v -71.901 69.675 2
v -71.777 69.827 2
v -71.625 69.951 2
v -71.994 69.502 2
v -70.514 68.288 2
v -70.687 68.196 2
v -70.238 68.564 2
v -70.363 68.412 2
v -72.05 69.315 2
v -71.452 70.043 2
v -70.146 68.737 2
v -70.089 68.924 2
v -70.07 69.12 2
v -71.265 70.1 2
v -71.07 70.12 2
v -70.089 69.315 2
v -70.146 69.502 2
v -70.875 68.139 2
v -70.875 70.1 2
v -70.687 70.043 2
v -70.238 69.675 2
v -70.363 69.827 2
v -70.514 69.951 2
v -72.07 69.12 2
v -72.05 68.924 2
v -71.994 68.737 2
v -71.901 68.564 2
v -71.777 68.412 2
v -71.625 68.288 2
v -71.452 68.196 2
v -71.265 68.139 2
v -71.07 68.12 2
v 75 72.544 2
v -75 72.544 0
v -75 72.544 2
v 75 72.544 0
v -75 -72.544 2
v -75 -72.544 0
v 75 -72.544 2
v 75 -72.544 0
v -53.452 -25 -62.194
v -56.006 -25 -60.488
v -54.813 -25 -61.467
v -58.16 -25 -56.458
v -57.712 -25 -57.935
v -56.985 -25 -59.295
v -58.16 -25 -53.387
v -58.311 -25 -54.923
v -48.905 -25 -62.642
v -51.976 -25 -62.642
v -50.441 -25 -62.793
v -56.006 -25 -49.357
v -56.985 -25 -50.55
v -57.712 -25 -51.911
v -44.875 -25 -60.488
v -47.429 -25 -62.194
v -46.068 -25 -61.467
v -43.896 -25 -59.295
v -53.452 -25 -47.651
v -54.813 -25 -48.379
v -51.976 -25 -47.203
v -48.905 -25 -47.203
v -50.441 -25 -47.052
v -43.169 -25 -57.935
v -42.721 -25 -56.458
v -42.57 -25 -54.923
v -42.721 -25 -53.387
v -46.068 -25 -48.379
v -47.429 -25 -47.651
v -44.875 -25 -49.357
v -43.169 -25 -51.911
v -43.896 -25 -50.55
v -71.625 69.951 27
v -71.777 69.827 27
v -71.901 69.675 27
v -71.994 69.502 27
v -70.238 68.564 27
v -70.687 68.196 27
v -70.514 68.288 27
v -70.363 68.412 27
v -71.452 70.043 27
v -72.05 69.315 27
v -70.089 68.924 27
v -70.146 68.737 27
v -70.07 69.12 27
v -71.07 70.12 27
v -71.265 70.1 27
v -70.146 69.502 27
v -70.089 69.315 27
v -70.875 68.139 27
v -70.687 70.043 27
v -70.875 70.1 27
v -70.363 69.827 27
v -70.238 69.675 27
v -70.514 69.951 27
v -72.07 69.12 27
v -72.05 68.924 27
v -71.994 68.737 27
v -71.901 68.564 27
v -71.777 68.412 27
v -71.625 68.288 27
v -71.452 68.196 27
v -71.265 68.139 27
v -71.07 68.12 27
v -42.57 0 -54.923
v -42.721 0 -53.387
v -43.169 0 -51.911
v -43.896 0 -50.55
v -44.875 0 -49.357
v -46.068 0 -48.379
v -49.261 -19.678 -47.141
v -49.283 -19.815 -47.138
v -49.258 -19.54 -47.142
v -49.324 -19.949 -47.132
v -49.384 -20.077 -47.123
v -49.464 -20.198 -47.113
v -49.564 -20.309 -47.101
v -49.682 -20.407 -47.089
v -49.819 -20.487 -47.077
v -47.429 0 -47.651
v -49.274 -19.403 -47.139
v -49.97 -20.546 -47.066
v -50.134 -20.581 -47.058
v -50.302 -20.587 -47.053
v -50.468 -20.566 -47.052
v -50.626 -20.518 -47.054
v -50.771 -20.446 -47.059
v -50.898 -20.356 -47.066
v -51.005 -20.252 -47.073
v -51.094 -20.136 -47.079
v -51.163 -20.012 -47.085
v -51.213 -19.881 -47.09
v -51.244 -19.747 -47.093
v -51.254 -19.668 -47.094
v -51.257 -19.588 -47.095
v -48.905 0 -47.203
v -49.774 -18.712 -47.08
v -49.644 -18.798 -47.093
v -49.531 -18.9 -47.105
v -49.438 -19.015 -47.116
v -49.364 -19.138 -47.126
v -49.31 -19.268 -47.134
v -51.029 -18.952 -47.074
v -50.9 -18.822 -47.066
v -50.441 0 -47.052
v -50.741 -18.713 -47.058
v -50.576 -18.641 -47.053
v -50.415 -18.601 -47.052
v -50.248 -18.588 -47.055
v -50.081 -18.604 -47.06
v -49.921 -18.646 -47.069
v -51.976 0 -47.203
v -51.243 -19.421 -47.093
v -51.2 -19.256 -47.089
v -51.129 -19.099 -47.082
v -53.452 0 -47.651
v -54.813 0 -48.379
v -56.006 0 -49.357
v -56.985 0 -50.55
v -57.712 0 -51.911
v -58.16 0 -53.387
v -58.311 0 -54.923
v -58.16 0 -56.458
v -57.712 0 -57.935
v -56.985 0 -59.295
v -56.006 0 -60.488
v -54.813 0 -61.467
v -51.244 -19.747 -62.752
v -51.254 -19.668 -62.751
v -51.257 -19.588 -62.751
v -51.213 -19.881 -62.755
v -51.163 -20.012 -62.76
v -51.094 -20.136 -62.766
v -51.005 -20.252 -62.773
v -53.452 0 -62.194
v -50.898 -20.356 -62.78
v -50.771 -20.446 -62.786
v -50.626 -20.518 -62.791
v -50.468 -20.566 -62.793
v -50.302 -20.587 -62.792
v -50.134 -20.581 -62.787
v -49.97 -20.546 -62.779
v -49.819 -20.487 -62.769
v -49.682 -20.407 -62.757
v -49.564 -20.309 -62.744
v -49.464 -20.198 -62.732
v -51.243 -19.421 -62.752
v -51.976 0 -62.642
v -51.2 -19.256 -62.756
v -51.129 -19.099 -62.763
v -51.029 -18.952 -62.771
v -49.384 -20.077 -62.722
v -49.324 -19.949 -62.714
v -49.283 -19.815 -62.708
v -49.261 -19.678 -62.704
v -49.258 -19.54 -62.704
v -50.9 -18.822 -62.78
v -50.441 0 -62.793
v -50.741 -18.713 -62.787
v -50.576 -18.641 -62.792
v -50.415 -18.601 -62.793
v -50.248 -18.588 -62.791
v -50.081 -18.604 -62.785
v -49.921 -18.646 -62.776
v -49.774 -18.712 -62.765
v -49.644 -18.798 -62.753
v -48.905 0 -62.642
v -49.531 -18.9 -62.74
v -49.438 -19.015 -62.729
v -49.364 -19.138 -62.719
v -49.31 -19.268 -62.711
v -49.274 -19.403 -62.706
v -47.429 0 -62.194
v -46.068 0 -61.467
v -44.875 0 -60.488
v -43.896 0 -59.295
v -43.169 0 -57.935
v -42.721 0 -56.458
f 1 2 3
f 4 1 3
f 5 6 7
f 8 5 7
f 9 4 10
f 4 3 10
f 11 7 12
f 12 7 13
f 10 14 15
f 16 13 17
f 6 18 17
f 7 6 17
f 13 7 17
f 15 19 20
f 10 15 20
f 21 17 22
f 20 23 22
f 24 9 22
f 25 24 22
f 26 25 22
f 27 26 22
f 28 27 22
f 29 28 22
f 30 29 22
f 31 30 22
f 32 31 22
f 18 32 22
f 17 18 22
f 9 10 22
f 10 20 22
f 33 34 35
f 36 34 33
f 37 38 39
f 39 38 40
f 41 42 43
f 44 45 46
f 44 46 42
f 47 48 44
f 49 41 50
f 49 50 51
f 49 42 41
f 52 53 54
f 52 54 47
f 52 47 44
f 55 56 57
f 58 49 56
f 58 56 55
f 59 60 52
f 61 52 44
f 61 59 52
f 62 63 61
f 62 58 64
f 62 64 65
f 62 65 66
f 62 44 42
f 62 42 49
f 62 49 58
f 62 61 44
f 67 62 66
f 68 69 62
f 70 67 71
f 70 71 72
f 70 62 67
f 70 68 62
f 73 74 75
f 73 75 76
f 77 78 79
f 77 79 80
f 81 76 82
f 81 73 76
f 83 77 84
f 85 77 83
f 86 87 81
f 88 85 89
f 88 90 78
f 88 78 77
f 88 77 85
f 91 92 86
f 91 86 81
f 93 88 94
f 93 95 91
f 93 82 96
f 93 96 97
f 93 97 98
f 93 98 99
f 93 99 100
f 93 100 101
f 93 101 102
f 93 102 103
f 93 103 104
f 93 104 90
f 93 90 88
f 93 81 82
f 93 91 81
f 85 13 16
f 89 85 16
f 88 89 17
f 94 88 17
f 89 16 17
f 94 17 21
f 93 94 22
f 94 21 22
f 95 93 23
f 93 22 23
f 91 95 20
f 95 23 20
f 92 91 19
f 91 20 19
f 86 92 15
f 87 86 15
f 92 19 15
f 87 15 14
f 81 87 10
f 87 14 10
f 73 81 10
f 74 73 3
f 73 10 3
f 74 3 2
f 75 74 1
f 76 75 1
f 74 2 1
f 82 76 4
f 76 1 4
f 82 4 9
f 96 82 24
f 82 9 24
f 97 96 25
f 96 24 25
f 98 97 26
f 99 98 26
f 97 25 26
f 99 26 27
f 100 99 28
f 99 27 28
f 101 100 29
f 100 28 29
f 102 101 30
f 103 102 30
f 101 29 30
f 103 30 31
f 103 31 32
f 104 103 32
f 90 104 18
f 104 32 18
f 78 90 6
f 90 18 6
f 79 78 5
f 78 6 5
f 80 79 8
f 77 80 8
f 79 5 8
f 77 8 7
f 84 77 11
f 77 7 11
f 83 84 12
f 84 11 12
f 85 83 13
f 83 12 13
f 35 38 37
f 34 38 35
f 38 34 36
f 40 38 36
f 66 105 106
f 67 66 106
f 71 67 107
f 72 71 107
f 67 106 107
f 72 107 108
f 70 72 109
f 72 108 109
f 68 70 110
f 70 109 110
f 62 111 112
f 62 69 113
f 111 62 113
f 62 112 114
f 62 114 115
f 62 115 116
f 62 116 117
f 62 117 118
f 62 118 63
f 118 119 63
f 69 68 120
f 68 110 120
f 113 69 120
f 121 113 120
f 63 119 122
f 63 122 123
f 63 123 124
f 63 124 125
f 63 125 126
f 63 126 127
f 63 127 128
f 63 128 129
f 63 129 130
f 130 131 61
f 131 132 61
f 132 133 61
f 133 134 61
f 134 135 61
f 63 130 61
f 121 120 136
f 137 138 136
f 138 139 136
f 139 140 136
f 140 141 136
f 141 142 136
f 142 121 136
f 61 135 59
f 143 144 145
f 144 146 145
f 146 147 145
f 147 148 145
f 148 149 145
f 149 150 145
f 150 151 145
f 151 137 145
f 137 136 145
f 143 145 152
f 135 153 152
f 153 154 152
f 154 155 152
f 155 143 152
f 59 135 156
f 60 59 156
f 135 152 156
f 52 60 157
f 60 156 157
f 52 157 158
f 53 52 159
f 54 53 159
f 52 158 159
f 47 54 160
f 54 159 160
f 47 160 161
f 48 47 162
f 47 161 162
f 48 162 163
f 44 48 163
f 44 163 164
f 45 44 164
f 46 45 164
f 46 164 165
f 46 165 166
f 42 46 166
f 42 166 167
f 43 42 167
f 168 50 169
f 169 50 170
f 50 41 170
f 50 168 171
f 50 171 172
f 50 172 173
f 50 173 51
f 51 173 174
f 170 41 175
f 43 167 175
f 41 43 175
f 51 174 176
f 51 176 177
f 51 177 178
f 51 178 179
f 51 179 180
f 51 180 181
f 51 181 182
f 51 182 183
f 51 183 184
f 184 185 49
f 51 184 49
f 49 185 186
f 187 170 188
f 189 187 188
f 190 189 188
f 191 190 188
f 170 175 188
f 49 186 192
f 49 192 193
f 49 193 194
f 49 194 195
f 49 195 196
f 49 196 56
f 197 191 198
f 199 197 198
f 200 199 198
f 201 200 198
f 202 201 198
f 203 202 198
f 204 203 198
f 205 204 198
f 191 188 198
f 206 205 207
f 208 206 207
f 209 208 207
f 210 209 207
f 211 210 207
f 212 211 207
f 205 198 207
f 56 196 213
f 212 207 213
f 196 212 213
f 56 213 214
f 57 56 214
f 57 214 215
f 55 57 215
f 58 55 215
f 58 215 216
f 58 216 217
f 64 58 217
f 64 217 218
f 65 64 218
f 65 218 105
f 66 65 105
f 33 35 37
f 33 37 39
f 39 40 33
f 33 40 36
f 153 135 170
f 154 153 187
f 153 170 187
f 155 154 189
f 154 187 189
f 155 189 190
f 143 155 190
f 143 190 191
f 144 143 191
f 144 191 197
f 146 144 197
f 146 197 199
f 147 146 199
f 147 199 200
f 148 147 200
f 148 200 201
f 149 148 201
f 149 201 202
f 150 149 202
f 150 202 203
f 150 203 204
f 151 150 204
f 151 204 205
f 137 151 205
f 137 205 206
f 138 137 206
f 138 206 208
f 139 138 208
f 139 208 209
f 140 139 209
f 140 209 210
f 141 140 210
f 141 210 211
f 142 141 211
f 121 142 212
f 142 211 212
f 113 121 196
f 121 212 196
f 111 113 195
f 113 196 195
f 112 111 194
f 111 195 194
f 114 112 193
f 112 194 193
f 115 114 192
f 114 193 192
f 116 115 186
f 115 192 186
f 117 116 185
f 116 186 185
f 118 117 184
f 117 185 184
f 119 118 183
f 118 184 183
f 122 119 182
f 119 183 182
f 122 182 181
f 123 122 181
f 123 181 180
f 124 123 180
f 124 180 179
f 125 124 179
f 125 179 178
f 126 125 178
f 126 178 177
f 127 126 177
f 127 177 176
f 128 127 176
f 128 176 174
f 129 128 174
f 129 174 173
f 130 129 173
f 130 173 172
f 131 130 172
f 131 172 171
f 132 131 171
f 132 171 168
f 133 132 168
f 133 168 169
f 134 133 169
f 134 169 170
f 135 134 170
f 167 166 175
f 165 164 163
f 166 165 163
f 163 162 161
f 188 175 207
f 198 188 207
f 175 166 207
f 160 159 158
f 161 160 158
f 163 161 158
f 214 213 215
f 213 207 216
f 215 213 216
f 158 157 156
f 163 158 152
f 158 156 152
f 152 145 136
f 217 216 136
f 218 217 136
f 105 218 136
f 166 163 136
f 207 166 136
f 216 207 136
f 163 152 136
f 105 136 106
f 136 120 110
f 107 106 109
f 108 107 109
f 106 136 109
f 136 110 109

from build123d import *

# Parameters (mm, degrees)
F0_W     = 150
F0_H     = 145.0873134014
F1_DEPTH = 2
F2_R     = 1
F3_DEPTH = 25
F4_R     = 7.8704486126
F5_DEPTH = 25
F7_D     = 2
F7_DEPTH = 150
F7_START = 47.141724
F7_TIP   = 0.600860619


with BuildPart() as f1:
    # F0 (on Top) → F1 (new body)
    with BuildSketch(Plane.XY):
        Rectangle(F0_W, F0_H)
    extrude(amount=F1_DEPTH)


with BuildPart() as f3:
    # F2 (on face) → F3 (new body)
    with BuildSketch(Plane.XY.offset(2)):
        with Locations((-71.069650352, 69.1195726395)):
            Circle(F2_R)
    extrude(amount=F3_DEPTH)


with BuildPart() as f5:
    # F4 (on Front) → F5 (new body)
    with BuildSketch(Plane.XZ):
        with Locations((-50.4405274987, -54.9226738513)):
            Circle(F4_R)
    extrude(amount=F5_DEPTH)

    # F7
    # its depths count from where the whole tool has entered the part; down to there all is cleared
    with Locations(Plane.XY.offset(-F7_START)):
        with Locations((-50.2569824457, -19.5883531123)):
            Hole(F7_D / 2, depth=F7_DEPTH)
            with Locations((0, 0, -(F7_DEPTH + F7_TIP / 2))):  # 118° drill point
                Cone(0, F7_D / 2, F7_TIP, mode=Mode.SUBTRACT)


solid = Compound([f1.part, f3.part, f5.part])
